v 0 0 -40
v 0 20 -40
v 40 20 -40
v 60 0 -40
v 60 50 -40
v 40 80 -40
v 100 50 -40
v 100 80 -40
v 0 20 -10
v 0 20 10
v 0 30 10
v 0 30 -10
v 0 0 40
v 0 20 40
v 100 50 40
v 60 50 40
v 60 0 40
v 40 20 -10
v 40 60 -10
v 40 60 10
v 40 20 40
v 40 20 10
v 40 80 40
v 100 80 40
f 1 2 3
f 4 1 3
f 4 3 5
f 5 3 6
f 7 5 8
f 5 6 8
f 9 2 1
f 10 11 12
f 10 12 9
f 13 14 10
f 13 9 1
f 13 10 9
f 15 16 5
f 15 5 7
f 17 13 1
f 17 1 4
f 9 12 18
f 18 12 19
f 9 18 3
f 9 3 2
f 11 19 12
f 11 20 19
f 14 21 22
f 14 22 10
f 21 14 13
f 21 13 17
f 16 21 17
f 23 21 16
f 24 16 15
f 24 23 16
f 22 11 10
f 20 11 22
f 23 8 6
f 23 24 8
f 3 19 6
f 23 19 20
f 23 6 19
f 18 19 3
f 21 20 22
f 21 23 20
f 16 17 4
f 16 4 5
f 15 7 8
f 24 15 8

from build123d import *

# Parameters (mm, degrees)
BOSS_EXTRUDE1_DEPTH = 40
BOSS_EXTRUDE2_DEPTH = 10


with BuildPart() as part:
    # Sketch1 → Boss-Extrude1 (new, symmetric)
    with BuildSketch(Plane.XY):
        Polygon((0, 20), (0, 0), (60, 0), (60, 50), (100, 50), (100, 80), (40, 80), (40, 60), (40, 20), align=None)
    extrude(amount=BOSS_EXTRUDE1_DEPTH, both=True)

    # Sketch1<3> → Boss-Extrude2 (add, symmetric)
    with BuildSketch(Plane.XY):
        Polygon((0, 30), (0, 20), (40, 20), (40, 60), align=None)
    extrude(amount=BOSS_EXTRUDE2_DEPTH, both=True)


solid = part.part
